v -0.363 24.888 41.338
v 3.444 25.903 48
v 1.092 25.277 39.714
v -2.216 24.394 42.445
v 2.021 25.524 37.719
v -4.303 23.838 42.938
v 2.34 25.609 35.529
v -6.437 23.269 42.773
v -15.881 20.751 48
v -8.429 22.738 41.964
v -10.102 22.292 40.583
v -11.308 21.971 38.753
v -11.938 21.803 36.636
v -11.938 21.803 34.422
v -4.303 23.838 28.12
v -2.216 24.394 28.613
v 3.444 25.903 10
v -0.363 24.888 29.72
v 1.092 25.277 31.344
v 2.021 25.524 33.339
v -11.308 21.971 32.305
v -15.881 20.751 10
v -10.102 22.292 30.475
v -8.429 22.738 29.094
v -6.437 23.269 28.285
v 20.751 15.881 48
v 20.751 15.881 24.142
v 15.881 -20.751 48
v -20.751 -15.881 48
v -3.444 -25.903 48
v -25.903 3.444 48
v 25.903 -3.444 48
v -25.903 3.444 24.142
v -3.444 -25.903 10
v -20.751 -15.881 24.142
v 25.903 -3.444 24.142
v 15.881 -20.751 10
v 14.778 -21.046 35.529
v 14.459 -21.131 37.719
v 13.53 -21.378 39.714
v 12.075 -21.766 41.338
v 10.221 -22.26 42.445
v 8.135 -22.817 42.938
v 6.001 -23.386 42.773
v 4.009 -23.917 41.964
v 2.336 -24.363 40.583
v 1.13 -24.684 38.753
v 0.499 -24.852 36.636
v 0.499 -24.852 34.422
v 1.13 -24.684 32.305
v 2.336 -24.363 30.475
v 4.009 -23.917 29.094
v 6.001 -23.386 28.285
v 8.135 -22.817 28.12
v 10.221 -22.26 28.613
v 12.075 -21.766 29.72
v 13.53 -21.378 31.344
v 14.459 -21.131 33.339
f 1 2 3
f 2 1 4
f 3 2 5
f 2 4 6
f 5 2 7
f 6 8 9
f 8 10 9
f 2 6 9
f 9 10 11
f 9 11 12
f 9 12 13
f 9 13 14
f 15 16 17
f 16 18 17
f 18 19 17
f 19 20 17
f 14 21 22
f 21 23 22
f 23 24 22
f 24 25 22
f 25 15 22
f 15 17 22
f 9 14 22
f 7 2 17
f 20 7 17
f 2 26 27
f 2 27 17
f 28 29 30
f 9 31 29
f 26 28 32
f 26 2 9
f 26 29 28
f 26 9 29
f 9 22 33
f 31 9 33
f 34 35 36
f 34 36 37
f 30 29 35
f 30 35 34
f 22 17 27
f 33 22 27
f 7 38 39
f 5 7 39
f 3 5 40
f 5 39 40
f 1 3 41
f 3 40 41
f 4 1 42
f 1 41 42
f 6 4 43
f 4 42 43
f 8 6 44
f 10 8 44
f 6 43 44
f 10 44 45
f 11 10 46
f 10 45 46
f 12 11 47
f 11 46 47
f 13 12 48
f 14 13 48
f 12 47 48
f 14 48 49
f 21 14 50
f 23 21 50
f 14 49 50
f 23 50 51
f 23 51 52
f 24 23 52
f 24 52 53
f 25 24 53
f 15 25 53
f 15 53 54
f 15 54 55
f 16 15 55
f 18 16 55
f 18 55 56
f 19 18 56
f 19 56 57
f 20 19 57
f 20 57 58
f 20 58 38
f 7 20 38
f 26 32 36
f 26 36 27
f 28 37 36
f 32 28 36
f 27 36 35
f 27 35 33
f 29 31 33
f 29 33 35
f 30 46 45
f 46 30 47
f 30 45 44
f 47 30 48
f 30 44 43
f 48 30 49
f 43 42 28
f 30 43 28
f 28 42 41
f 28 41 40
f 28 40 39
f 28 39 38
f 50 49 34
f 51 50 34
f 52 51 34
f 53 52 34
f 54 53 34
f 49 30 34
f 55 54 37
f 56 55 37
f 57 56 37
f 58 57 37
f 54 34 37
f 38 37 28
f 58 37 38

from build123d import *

# Parameters (mm, degrees)
F1_DEPTH = 48
F2_W     = 20
F2_H     = 24.1421356237
F3_DEPTH = 55.8448557599
F4_R     = 7.4299584593
F5_DEPTH = 55.8448557599


with BuildPart() as f1:
    # F0 (on Top) → F1 (new body)
    with BuildSketch(Plane.XY):
        Polygon((-15.8813725217, 20.7514992061), (-25.9033520131, 3.4436996038), (-20.7514992061, -15.8813725217), (-3.4436996038, -25.9033520131), (15.8813725217, -20.7514992061), (25.9033520131, -3.4436996038), (20.7514992061, 15.8813725217), (3.4436996038, 25.9033520131), align=None)
    extrude(amount=F1_DEPTH)

    # F2 (on face) → F3 (cut, through all)
    with BuildSketch(Plane(origin=(23.3274256096, 6.218836459, 0), x_dir=(-0.2575926403, 0.9662536063, 0), z_dir=(0.9662536063, 0.2575926403, 0))):
        Polygon((-10, 24.1421356237), (-24.1421356237, 10), (-24.1421356237, -10), (-10, -24.1421356237), (10, -24.1421356237), (24.1421356237, -10), (24.1421356237, 10), (10, 24.1421356237), (10, 0), (-10, 0), align=None)
        with Locations((0, 12.0710678119)):
            Rectangle(F2_W, F2_H)
    extrude(amount=-F3_DEPTH, mode=Mode.SUBTRACT)

    # F4 (on face) → F5 (cut, through all)
    with BuildSketch(Plane(origin=(6.218836459, -23.3274256096, 0), x_dir=(0.9662536063, 0.2575926403, 0), z_dir=(0.2575926403, -0.9662536063, 0))):
        with Locations((1.4277122682, 35.5290137231)):
            Circle(F4_R)
    extrude(amount=-F5_DEPTH, mode=Mode.SUBTRACT)


solid = f1.part
